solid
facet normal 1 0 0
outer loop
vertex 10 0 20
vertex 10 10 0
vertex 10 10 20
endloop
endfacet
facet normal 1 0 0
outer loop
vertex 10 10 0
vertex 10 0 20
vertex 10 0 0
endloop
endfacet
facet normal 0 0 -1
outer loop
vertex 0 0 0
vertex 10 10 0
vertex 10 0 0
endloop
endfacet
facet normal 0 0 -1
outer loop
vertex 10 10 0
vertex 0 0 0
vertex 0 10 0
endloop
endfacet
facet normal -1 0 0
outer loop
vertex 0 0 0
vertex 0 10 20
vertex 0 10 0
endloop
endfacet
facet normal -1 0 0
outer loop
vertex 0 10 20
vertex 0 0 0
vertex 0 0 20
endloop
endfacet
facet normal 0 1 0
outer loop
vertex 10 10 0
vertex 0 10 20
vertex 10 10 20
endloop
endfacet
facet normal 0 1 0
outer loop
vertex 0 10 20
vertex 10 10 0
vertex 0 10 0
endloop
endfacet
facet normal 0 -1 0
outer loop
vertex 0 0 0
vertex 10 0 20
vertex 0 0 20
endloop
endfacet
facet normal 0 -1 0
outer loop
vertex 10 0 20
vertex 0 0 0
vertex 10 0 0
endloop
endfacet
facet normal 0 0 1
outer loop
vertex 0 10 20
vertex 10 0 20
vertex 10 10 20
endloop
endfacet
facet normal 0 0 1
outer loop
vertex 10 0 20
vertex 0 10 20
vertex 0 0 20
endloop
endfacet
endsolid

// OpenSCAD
// Corpus model: two stacked unit-ish cubes sharing a face (coplanar union).
union() {
    cube(10);
    translate([0, 0, 10]) cube(10);
}
